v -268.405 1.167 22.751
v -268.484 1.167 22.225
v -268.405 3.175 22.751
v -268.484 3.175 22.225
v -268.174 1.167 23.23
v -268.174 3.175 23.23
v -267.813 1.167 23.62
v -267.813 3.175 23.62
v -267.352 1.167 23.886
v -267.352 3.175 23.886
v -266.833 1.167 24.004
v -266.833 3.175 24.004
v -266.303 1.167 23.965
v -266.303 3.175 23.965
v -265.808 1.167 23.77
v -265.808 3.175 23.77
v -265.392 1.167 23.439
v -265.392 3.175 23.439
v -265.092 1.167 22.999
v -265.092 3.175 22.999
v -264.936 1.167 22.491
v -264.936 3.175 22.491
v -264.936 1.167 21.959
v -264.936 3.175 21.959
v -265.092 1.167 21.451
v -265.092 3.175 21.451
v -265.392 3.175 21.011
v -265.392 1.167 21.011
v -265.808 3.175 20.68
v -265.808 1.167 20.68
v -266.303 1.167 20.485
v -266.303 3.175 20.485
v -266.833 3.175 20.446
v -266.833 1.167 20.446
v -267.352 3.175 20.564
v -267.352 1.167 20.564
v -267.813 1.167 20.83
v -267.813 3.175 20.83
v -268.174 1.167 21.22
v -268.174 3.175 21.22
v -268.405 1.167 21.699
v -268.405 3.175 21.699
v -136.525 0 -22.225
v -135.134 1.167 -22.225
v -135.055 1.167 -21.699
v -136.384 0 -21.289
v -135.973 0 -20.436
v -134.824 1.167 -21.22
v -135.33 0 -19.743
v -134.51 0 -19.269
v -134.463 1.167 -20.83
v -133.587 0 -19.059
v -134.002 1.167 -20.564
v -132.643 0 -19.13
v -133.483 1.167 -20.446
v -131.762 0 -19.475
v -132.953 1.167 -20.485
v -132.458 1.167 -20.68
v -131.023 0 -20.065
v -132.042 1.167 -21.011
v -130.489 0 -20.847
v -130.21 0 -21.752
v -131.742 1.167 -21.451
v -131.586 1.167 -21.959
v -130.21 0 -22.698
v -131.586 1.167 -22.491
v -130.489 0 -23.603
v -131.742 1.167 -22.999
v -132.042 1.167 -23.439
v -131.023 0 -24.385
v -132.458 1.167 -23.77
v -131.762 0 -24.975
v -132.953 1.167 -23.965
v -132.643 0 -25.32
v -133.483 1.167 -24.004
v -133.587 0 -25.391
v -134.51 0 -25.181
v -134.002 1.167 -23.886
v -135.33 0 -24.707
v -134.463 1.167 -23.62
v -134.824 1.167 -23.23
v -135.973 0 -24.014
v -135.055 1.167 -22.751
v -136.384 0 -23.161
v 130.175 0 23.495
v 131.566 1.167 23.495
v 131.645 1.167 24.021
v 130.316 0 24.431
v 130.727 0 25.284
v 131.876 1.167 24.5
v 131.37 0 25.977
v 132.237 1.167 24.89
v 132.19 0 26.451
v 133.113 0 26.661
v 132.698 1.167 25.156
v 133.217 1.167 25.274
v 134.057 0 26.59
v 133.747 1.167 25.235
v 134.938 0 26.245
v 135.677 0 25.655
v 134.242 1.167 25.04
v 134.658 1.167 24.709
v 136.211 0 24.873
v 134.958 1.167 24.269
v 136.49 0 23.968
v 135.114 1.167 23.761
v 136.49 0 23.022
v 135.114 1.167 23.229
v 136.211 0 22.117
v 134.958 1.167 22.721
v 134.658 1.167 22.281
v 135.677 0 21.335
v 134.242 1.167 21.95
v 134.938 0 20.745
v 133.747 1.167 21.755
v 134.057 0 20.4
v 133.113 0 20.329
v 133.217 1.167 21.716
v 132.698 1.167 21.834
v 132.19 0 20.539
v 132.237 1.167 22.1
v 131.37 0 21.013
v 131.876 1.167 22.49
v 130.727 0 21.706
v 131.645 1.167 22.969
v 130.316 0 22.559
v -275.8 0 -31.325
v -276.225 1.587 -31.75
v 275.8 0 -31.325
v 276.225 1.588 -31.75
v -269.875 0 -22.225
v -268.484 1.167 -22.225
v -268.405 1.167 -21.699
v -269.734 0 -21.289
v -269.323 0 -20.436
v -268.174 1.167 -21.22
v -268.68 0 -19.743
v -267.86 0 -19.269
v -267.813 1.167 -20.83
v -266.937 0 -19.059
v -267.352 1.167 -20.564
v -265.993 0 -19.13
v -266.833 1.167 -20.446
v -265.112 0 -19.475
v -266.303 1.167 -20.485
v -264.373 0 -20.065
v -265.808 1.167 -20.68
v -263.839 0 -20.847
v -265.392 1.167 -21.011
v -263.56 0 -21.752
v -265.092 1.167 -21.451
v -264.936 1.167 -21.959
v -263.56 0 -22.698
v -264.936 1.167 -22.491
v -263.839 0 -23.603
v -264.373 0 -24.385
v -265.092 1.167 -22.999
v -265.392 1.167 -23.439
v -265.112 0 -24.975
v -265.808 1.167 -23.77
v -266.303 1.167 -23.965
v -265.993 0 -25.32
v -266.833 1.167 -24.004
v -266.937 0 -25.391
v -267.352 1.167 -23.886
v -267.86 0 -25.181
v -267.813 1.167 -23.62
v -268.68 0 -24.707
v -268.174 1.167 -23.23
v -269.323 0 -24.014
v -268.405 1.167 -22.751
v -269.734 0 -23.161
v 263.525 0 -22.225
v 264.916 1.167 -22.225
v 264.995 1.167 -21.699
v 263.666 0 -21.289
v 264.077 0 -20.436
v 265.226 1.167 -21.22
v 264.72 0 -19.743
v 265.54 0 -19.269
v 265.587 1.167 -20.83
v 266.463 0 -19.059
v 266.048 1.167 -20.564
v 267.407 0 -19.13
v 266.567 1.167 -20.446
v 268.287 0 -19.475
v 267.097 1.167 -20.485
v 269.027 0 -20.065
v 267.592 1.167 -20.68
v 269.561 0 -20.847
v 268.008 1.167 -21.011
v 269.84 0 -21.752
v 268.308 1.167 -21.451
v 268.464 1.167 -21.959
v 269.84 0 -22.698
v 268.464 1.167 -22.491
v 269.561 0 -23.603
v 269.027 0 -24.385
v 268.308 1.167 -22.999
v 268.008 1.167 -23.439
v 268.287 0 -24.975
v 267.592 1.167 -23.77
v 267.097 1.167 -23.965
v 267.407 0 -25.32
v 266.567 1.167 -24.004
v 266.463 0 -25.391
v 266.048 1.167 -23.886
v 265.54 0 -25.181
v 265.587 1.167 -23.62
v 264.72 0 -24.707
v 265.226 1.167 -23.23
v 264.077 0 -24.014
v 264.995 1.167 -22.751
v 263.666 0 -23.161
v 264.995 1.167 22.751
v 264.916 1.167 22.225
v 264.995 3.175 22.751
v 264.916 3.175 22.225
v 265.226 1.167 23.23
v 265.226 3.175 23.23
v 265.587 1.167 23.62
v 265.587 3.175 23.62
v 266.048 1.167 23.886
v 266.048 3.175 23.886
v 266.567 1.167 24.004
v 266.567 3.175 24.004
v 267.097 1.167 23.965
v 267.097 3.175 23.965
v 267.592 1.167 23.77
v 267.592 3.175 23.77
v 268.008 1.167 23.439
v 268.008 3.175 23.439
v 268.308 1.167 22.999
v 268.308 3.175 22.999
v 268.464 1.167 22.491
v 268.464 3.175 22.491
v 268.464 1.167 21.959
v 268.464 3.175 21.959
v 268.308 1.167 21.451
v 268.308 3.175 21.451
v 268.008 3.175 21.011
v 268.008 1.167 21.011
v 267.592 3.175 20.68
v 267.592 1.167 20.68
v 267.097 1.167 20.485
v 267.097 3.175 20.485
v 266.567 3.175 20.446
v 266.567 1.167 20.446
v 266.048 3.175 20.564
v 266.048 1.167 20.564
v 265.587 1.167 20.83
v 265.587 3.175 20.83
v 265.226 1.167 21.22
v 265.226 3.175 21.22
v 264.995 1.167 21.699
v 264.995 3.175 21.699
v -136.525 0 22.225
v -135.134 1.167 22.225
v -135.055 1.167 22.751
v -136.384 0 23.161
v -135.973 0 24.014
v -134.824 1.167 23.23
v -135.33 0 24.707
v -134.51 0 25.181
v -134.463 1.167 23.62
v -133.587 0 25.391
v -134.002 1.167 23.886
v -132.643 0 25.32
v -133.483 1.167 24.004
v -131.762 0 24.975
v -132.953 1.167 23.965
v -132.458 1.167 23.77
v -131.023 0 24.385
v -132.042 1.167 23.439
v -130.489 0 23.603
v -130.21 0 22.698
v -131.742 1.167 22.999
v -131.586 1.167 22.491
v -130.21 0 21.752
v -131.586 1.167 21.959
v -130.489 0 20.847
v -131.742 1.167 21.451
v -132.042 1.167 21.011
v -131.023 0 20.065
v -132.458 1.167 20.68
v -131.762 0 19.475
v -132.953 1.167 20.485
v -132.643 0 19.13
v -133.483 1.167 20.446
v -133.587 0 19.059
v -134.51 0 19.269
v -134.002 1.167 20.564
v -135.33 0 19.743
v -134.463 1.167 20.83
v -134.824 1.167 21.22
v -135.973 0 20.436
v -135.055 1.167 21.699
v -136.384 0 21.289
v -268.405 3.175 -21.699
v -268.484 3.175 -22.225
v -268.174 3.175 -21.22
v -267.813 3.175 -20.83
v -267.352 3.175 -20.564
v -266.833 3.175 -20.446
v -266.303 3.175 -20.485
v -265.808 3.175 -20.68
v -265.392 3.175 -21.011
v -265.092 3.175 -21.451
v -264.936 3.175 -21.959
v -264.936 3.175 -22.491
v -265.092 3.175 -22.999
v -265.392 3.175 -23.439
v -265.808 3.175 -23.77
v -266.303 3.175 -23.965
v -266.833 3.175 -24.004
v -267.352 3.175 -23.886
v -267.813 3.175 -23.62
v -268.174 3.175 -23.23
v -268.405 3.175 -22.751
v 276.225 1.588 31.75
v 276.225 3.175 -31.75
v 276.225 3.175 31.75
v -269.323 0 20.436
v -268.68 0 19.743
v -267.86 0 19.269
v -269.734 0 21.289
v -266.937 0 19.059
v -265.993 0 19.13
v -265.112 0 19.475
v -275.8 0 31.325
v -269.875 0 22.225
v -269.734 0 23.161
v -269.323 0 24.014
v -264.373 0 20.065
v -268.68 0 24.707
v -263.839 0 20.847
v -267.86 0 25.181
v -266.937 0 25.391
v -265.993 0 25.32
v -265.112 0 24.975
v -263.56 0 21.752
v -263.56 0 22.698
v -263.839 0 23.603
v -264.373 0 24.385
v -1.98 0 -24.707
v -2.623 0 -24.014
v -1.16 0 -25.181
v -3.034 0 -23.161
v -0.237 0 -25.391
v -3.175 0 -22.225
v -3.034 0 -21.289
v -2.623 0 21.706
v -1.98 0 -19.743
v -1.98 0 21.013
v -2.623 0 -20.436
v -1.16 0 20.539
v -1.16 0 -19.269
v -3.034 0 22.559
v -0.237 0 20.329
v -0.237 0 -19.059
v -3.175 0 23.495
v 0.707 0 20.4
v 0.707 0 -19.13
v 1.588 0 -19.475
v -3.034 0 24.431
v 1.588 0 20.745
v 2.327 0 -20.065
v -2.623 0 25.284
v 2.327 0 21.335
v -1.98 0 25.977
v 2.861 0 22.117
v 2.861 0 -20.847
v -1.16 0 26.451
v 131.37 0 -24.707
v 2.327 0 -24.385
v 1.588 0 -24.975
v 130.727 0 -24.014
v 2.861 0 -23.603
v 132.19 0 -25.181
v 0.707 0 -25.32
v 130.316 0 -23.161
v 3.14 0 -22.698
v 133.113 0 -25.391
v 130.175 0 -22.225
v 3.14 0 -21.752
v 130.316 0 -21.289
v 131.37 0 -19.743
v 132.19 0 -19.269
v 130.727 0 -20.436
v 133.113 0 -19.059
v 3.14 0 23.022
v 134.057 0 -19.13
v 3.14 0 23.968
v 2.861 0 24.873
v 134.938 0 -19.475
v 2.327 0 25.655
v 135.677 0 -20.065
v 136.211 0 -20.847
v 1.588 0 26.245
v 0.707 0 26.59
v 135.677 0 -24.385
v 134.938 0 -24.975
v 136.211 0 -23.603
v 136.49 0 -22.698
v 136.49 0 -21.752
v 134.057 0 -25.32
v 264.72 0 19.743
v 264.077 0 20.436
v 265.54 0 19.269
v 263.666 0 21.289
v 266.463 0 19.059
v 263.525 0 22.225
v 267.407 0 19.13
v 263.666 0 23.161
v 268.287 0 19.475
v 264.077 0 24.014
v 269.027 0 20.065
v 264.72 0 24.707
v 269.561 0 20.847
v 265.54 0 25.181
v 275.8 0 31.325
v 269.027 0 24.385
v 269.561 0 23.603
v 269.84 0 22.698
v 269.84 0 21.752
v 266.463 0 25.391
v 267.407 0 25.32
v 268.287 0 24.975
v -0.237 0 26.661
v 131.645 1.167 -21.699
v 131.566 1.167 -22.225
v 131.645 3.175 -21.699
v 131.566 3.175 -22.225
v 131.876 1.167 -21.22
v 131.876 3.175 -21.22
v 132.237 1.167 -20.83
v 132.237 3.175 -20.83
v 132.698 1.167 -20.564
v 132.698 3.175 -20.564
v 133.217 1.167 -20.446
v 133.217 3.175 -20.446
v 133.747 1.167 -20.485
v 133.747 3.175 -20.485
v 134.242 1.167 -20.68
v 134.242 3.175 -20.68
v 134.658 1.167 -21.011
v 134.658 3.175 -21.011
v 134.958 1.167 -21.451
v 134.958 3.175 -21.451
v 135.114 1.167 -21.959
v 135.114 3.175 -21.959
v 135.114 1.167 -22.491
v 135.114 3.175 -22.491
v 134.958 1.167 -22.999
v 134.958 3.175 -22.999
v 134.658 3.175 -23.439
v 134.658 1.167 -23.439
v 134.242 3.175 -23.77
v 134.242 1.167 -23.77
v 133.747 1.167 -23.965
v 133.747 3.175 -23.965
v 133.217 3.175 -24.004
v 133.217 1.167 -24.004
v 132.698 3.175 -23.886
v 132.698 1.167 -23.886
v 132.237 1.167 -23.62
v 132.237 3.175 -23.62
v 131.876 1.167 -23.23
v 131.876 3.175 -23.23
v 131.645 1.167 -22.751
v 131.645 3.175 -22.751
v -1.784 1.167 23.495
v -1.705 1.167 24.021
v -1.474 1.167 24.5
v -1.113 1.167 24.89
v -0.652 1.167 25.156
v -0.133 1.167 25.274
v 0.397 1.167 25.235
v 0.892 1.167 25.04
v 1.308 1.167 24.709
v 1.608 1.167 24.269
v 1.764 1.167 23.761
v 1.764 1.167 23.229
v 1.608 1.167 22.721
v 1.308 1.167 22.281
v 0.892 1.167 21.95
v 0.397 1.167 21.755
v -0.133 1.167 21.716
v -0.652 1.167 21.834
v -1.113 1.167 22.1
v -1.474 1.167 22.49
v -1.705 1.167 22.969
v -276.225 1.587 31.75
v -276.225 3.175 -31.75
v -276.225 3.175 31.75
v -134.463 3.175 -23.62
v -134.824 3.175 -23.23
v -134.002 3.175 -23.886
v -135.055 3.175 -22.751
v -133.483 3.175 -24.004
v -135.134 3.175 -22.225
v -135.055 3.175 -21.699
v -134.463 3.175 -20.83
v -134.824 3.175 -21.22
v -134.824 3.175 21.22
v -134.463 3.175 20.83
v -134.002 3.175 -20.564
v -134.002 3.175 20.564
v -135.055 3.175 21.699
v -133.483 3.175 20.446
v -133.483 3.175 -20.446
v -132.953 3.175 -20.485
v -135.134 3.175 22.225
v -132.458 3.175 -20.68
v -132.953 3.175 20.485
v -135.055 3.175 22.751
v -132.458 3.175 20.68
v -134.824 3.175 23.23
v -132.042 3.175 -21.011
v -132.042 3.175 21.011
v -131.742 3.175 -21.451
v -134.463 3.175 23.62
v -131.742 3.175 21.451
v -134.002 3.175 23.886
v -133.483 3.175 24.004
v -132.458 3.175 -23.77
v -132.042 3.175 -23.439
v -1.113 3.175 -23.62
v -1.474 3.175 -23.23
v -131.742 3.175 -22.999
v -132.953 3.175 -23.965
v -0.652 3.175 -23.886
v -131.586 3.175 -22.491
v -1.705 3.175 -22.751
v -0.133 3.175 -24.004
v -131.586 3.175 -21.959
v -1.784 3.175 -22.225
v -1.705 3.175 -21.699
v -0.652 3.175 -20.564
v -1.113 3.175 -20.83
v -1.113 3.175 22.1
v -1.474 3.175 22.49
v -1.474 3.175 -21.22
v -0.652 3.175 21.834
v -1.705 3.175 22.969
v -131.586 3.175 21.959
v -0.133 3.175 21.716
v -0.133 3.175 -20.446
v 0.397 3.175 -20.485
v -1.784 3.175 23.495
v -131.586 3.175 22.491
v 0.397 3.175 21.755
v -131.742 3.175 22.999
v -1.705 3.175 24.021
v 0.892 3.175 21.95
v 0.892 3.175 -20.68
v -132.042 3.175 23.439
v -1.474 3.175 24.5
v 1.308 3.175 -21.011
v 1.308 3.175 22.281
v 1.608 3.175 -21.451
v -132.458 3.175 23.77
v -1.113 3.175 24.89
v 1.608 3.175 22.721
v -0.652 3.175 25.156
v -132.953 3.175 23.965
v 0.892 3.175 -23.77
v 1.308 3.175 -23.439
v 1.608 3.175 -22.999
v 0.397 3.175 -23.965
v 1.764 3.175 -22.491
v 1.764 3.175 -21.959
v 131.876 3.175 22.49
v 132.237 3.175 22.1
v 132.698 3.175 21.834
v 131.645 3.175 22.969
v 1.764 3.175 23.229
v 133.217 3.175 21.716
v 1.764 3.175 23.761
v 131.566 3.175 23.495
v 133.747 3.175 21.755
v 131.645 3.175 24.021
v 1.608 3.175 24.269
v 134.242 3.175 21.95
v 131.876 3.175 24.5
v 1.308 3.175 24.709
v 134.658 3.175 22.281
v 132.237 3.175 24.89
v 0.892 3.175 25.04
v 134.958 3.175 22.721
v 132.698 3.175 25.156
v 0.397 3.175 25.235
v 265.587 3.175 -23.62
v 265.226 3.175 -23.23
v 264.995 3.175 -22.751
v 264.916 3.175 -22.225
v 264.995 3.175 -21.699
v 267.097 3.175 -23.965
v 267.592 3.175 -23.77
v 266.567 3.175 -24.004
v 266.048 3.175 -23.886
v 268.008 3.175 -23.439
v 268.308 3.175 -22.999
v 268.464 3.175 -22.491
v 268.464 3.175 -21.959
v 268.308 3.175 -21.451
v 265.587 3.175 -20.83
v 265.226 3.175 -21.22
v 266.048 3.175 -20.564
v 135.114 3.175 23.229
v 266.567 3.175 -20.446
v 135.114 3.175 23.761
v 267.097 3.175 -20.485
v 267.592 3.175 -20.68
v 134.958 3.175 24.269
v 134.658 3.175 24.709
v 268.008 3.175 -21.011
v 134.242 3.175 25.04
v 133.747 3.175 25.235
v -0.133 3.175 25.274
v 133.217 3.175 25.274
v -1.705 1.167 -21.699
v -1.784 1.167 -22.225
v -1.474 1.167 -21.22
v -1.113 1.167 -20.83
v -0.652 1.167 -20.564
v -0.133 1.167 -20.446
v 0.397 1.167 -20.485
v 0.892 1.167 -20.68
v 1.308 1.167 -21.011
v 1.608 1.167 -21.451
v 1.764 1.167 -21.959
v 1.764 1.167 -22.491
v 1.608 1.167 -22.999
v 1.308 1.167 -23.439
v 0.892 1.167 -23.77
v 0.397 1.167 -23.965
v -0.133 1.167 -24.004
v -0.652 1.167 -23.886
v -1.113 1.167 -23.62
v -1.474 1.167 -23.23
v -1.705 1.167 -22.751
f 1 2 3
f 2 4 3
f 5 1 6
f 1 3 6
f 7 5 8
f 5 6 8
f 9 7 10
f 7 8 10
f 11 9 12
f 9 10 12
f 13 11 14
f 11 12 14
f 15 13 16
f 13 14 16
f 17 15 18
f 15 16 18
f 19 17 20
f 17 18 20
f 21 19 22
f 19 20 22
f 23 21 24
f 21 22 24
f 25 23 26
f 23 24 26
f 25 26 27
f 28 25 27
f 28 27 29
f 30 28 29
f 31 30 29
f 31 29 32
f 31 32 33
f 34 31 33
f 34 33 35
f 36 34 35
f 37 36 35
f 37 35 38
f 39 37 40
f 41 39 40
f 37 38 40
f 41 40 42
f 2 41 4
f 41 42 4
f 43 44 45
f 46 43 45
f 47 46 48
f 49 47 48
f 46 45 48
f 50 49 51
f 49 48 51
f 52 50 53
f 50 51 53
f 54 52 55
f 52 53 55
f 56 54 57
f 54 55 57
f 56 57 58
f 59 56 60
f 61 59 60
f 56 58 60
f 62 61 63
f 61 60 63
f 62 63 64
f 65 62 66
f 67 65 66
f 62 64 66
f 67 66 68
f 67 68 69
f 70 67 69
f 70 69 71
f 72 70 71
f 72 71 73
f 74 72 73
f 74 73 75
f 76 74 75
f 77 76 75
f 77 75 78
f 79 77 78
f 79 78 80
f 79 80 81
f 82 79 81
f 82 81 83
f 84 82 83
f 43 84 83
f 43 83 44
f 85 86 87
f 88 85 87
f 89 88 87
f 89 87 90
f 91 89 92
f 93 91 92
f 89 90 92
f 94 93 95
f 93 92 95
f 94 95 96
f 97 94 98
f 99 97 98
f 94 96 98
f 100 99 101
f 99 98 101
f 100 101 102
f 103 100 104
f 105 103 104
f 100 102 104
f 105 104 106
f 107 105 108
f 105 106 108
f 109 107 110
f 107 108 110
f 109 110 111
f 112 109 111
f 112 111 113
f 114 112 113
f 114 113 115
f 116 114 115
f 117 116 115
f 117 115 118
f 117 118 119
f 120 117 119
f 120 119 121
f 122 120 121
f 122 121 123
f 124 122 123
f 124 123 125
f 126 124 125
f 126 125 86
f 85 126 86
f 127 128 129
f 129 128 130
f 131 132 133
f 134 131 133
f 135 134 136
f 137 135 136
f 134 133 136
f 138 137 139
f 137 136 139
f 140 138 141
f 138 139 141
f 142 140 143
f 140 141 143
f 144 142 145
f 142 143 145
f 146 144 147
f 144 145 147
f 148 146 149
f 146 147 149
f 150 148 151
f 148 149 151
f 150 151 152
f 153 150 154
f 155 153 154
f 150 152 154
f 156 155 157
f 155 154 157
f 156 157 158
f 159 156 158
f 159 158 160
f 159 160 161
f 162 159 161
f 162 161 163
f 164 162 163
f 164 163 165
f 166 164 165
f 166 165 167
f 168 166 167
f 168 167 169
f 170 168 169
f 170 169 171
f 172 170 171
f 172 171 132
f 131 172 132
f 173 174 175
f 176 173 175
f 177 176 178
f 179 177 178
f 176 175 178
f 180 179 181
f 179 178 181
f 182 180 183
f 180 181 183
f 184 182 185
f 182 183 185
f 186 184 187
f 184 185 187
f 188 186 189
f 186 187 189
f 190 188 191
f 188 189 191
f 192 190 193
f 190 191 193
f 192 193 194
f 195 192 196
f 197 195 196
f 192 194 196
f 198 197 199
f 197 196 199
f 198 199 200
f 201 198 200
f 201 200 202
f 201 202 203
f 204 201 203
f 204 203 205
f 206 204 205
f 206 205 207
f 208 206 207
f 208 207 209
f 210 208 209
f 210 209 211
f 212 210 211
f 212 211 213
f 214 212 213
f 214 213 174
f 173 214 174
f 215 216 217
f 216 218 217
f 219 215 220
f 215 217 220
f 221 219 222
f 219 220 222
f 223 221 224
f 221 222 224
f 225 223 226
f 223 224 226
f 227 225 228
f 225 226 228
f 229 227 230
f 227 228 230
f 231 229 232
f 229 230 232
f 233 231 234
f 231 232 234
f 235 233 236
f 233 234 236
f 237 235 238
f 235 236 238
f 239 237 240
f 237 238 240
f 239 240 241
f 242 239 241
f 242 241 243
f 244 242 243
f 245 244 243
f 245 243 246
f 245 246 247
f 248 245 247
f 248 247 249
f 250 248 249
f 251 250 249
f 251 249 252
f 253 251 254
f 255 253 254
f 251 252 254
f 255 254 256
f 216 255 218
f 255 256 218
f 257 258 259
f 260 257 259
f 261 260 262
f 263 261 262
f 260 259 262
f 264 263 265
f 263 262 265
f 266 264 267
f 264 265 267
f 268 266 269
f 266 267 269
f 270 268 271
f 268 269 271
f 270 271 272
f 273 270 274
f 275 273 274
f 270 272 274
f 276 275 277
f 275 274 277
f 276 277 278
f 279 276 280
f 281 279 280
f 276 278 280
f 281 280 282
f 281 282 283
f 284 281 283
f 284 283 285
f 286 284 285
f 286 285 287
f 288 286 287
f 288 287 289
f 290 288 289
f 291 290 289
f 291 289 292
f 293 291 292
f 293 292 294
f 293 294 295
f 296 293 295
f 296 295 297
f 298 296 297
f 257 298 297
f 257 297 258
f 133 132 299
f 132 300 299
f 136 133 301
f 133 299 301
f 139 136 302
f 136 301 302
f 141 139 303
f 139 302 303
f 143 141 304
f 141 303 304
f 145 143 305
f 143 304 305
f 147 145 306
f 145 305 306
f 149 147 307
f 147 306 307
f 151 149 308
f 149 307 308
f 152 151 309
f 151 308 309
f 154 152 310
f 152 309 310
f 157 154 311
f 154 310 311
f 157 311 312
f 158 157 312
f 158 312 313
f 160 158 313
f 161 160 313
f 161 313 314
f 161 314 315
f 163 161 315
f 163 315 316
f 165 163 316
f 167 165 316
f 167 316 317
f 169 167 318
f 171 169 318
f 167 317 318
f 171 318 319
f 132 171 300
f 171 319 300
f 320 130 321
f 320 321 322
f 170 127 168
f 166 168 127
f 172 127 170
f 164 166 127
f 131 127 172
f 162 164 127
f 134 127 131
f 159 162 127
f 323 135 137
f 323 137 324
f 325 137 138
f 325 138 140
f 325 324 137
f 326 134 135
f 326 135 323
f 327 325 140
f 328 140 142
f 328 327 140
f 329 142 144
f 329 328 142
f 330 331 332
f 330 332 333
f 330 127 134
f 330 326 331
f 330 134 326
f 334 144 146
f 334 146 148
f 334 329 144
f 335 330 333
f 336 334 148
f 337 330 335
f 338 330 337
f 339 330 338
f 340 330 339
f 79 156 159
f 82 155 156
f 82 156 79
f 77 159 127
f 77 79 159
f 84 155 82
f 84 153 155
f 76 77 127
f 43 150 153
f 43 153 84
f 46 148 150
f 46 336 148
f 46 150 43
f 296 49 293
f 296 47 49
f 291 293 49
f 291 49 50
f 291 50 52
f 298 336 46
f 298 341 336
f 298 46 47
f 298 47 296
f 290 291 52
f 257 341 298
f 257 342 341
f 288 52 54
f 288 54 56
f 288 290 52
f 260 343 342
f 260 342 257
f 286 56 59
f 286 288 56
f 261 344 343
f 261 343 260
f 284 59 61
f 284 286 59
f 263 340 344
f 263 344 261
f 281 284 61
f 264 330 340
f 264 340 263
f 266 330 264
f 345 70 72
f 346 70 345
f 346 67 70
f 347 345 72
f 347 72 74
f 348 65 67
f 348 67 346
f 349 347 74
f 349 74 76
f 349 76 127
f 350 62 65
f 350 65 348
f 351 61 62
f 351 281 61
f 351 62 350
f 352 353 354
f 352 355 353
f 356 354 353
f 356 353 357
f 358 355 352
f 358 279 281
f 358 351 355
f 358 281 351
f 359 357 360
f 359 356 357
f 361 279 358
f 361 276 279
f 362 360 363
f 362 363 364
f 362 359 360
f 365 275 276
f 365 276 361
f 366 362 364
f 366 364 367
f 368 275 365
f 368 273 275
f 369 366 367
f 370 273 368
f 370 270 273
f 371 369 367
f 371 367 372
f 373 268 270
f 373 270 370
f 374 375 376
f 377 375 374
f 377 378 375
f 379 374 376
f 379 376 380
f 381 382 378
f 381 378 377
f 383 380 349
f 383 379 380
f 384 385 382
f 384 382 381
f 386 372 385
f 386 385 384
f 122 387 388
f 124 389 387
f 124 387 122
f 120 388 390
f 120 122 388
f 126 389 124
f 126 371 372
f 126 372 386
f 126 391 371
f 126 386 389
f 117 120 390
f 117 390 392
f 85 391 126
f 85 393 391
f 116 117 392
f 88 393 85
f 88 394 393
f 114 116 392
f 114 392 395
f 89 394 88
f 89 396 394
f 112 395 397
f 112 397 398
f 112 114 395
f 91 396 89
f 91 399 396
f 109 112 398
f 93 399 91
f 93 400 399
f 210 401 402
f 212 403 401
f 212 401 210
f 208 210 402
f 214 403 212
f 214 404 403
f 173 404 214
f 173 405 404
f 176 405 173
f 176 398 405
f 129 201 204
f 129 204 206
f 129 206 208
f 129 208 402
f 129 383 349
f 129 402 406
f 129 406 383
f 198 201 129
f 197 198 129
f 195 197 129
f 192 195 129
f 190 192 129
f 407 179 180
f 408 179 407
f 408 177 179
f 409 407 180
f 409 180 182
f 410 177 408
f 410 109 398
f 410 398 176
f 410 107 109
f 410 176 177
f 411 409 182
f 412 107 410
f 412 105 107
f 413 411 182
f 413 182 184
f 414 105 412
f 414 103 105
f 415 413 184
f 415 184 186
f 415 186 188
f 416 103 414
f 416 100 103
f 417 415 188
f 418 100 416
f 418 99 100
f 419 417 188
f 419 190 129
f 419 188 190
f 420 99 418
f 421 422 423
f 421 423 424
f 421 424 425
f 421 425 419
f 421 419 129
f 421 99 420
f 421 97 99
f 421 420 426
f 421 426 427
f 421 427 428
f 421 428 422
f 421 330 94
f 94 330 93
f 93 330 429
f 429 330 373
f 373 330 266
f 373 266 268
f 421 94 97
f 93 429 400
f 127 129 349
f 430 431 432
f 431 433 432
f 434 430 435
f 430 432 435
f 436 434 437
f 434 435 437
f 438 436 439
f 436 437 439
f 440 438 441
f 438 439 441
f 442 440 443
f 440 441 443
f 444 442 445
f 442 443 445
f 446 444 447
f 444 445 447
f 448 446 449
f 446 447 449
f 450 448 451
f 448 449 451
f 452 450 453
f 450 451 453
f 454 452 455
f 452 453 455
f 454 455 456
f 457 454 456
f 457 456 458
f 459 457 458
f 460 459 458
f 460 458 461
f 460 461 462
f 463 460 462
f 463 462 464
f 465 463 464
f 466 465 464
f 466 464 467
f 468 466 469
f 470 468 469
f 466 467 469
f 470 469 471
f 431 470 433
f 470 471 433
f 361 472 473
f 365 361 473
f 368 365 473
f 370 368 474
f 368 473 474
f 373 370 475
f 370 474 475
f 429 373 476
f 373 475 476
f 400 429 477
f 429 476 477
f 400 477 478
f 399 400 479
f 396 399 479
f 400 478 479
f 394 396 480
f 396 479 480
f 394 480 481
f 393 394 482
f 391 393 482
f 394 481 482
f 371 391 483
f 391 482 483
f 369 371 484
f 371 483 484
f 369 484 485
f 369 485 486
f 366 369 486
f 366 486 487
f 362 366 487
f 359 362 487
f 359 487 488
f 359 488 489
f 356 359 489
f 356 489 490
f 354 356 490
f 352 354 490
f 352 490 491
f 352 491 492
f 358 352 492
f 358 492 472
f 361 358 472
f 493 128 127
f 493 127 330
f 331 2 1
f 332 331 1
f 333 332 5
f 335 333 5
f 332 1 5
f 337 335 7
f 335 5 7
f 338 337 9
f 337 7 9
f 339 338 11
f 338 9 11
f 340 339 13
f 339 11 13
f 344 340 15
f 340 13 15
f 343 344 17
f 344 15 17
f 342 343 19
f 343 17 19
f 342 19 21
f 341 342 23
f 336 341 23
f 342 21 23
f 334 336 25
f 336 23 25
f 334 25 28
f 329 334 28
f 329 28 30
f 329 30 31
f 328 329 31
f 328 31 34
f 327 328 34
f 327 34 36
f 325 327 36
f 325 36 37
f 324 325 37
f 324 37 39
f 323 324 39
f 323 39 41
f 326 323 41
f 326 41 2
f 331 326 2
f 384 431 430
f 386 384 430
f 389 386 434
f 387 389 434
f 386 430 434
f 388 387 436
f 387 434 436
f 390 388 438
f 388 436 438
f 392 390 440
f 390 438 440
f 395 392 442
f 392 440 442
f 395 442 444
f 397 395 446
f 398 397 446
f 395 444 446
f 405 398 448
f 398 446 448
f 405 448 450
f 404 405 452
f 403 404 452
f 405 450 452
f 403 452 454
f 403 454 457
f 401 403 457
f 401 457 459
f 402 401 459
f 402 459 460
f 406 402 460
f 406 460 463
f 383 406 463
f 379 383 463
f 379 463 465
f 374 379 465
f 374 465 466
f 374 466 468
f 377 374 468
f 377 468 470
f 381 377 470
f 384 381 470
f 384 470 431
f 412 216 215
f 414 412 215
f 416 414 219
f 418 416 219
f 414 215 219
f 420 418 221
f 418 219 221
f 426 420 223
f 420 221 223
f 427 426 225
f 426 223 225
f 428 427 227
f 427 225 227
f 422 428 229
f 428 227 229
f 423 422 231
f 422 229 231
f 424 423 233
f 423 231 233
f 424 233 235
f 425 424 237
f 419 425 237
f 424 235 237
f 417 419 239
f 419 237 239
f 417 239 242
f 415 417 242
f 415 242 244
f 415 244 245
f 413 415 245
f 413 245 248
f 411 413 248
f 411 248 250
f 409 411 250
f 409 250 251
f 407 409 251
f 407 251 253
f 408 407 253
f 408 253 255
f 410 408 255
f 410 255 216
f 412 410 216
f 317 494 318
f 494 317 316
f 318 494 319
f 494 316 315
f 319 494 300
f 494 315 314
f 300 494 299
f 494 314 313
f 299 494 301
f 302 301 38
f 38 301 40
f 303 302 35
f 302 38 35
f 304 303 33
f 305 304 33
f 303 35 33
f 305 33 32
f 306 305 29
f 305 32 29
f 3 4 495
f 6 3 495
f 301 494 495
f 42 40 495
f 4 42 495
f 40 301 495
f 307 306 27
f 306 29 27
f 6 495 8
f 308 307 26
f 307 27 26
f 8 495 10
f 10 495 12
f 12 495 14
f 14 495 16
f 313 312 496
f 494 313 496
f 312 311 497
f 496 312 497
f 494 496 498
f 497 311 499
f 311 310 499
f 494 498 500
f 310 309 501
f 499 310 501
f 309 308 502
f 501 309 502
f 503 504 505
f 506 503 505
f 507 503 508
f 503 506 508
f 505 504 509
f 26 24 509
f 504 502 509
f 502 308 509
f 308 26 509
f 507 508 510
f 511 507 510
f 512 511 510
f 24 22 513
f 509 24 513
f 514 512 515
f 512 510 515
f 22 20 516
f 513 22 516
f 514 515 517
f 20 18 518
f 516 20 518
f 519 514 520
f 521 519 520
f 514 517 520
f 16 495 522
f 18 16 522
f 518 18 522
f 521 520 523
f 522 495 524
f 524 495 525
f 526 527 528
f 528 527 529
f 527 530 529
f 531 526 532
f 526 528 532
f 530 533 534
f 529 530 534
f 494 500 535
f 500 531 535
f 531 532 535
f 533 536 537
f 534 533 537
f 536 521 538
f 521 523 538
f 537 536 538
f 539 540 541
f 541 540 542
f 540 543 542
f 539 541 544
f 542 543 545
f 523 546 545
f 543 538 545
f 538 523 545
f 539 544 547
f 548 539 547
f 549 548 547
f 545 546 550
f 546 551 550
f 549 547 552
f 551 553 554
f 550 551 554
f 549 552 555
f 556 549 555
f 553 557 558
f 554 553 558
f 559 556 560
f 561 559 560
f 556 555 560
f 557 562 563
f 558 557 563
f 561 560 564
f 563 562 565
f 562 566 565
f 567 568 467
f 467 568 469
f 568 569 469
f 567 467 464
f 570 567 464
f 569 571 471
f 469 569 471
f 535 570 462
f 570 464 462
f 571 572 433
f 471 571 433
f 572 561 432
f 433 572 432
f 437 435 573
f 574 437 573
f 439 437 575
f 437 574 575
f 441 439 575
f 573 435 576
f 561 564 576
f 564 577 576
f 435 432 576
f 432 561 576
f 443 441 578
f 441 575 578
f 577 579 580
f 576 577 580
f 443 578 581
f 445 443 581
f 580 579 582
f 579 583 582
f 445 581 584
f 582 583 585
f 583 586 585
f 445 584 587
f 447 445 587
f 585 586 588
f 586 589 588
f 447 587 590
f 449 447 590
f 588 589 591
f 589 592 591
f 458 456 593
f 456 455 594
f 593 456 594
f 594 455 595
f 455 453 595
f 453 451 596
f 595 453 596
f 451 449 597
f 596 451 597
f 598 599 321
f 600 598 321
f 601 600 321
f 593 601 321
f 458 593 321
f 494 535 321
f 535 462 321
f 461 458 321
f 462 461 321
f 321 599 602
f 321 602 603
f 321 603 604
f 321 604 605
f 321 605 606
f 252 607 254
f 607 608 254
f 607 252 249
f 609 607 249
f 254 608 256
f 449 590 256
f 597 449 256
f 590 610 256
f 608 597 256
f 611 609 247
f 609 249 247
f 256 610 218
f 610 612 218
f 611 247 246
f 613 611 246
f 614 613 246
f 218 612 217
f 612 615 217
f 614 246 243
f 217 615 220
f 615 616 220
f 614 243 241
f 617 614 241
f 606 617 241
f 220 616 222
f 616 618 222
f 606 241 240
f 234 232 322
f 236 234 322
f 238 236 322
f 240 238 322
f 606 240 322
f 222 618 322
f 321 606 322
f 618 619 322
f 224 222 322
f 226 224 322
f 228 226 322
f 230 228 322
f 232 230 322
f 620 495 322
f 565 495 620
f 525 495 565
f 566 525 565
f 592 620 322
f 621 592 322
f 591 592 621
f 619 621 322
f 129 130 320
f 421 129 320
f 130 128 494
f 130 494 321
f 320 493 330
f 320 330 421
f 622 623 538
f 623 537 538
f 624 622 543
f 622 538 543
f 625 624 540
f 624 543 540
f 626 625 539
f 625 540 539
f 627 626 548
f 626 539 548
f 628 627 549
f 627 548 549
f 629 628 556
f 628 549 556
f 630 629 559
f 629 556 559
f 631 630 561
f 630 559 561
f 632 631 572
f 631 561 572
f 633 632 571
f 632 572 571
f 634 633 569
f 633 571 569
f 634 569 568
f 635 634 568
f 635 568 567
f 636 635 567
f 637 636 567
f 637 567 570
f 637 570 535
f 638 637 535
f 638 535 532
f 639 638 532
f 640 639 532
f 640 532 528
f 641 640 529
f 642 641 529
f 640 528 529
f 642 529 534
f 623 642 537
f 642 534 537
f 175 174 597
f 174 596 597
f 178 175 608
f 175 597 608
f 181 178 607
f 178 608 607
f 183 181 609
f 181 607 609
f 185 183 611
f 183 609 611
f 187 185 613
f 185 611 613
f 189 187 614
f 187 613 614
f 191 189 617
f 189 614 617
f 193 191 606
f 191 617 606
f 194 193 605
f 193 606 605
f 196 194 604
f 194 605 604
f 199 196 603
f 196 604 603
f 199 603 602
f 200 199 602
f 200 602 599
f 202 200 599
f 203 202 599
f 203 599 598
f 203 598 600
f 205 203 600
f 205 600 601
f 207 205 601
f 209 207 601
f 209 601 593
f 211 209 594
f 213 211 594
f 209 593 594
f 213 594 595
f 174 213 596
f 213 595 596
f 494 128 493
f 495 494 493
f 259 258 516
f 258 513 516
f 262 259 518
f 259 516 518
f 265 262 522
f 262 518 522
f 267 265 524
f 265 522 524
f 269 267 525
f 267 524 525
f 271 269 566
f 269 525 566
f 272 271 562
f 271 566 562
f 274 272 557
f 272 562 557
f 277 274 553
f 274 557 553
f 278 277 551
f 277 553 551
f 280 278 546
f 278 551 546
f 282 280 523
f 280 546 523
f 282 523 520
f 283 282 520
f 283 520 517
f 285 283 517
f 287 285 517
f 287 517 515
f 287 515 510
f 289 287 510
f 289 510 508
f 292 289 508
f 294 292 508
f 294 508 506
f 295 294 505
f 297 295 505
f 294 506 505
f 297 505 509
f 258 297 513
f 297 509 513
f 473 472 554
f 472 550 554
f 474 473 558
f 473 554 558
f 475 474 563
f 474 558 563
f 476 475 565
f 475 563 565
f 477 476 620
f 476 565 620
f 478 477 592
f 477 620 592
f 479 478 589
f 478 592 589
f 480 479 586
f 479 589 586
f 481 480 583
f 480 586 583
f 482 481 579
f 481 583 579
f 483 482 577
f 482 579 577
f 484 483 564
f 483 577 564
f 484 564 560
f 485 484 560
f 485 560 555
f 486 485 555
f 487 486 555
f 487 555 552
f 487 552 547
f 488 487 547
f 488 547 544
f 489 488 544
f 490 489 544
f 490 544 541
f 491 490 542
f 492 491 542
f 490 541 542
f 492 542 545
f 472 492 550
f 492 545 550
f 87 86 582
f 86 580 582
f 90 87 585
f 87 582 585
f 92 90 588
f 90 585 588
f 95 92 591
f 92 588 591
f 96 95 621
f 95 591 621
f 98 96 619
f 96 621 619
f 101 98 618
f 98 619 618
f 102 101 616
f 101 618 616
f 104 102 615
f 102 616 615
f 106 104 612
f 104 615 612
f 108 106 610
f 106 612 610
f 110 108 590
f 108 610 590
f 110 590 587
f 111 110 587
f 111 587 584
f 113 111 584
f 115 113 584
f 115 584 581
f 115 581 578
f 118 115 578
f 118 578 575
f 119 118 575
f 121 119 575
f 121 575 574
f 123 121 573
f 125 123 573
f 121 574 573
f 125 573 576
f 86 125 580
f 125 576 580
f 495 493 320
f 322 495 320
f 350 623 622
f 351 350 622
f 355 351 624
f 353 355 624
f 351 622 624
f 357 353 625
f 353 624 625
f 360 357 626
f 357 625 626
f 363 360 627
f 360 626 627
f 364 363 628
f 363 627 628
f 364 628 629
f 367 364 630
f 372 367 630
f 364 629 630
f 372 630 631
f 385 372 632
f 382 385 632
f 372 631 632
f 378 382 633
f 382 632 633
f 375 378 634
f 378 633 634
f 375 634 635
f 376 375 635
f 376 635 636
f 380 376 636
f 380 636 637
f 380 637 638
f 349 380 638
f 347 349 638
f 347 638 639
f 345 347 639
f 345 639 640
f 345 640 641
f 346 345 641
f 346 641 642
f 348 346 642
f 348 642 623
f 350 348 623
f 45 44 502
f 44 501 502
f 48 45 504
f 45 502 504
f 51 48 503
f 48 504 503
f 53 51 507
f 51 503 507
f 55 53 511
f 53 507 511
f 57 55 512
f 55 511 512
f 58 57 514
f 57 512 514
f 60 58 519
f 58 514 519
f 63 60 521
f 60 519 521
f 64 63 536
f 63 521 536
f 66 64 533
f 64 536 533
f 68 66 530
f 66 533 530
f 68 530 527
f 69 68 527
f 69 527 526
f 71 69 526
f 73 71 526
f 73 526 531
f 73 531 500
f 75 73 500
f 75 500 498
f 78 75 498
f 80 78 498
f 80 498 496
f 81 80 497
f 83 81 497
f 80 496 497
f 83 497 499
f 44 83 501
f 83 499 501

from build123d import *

# Parameters (mm, degrees)
F0_W           = 552.45
F0_H           = 63.5
F0_R           = 1.63195
F1_DEPTH       = 3.175
F3_D           = 3.5687
F3_CSINK_D     = 6.35
F3_CSINK_ANGLE = 100
F4_SIZE2       = 1.5875
F4_SIZE        = 0.425369343


with BuildPart() as f1:
    # F0 (on Front) → F1 (new body)
    with BuildSketch(Plane.XZ):
        Rectangle(F0_W, F0_H)
        with Locations((-266.7, -22.225)):
            Circle(F0_R, mode=Mode.SUBTRACT)
        with Locations((-131.445, -22.225)):
            Circle(F0_R, mode=Mode.SUBTRACT)
        with Locations((0, -22.225)):
            Circle(F0_R, mode=Mode.SUBTRACT)
        with Locations((130.175, -22.225)):
            Circle(F0_R, mode=Mode.SUBTRACT)
        with Locations((266.7, -22.225)):
            Circle(F0_R, mode=Mode.SUBTRACT)
        with Locations((-266.7, 22.225)):
            Circle(F0_R, mode=Mode.SUBTRACT)
        with Locations((-131.445, 22.225)):
            Circle(F0_R, mode=Mode.SUBTRACT)
        with Locations((0, 23.495)):
            Circle(F0_R, mode=Mode.SUBTRACT)
        with Locations((130.175, 23.495)):
            Circle(F0_R, mode=Mode.SUBTRACT)
        with Locations((266.7, 22.225)):
            Circle(F0_R, mode=Mode.SUBTRACT)
        with Locations((-266.7, 22.225)):
            Circle(F0_R)
        with Locations((-131.445, 22.225)):
            Circle(F0_R)
        with Locations((0, 23.495)):
            Circle(F0_R)
        with Locations((130.175, 23.495)):
            Circle(F0_R)
        with Locations((266.7, 22.225)):
            Circle(F0_R)
        with Locations((-266.7, -22.225)):
            Circle(F0_R)
        with Locations((-131.445, -22.225)):
            Circle(F0_R)
        with Locations((0, -22.225)):
            Circle(F0_R)
        with Locations((130.175, -22.225)):
            Circle(F0_R)
        with Locations((266.7, -22.225)):
            Circle(F0_R)
    extrude(amount=-F1_DEPTH)

    # F3 (through all)
    with Locations(Plane.XZ):
        with Locations((-266.7, 22.225), (-133.35, 22.225), (0, 23.495), (-266.7, -22.225), (-133.35, -22.225), (0, -22.225), (133.35, 23.495), (133.35, -22.225), (266.7, -22.225), (266.7, 22.225)):
            CounterSinkHole(F3_D / 2, F3_CSINK_D / 2, counter_sink_angle=F3_CSINK_ANGLE)

    # F4
    f4_edges = [f1.edges().sort_by_distance(p)[0] for p in [
        (0, 0, 31.75),
        (276.225, 0, 0),
        (0, 0, -31.75),
        (-276.225, 0, 0),
    ]]
    f4_side = f1.faces().sort_by_distance((0, 0, -0.002312))[0]
    chamfer(f4_edges, length=F4_SIZE, length2=F4_SIZE2, reference=f4_side)


solid = f1.part
